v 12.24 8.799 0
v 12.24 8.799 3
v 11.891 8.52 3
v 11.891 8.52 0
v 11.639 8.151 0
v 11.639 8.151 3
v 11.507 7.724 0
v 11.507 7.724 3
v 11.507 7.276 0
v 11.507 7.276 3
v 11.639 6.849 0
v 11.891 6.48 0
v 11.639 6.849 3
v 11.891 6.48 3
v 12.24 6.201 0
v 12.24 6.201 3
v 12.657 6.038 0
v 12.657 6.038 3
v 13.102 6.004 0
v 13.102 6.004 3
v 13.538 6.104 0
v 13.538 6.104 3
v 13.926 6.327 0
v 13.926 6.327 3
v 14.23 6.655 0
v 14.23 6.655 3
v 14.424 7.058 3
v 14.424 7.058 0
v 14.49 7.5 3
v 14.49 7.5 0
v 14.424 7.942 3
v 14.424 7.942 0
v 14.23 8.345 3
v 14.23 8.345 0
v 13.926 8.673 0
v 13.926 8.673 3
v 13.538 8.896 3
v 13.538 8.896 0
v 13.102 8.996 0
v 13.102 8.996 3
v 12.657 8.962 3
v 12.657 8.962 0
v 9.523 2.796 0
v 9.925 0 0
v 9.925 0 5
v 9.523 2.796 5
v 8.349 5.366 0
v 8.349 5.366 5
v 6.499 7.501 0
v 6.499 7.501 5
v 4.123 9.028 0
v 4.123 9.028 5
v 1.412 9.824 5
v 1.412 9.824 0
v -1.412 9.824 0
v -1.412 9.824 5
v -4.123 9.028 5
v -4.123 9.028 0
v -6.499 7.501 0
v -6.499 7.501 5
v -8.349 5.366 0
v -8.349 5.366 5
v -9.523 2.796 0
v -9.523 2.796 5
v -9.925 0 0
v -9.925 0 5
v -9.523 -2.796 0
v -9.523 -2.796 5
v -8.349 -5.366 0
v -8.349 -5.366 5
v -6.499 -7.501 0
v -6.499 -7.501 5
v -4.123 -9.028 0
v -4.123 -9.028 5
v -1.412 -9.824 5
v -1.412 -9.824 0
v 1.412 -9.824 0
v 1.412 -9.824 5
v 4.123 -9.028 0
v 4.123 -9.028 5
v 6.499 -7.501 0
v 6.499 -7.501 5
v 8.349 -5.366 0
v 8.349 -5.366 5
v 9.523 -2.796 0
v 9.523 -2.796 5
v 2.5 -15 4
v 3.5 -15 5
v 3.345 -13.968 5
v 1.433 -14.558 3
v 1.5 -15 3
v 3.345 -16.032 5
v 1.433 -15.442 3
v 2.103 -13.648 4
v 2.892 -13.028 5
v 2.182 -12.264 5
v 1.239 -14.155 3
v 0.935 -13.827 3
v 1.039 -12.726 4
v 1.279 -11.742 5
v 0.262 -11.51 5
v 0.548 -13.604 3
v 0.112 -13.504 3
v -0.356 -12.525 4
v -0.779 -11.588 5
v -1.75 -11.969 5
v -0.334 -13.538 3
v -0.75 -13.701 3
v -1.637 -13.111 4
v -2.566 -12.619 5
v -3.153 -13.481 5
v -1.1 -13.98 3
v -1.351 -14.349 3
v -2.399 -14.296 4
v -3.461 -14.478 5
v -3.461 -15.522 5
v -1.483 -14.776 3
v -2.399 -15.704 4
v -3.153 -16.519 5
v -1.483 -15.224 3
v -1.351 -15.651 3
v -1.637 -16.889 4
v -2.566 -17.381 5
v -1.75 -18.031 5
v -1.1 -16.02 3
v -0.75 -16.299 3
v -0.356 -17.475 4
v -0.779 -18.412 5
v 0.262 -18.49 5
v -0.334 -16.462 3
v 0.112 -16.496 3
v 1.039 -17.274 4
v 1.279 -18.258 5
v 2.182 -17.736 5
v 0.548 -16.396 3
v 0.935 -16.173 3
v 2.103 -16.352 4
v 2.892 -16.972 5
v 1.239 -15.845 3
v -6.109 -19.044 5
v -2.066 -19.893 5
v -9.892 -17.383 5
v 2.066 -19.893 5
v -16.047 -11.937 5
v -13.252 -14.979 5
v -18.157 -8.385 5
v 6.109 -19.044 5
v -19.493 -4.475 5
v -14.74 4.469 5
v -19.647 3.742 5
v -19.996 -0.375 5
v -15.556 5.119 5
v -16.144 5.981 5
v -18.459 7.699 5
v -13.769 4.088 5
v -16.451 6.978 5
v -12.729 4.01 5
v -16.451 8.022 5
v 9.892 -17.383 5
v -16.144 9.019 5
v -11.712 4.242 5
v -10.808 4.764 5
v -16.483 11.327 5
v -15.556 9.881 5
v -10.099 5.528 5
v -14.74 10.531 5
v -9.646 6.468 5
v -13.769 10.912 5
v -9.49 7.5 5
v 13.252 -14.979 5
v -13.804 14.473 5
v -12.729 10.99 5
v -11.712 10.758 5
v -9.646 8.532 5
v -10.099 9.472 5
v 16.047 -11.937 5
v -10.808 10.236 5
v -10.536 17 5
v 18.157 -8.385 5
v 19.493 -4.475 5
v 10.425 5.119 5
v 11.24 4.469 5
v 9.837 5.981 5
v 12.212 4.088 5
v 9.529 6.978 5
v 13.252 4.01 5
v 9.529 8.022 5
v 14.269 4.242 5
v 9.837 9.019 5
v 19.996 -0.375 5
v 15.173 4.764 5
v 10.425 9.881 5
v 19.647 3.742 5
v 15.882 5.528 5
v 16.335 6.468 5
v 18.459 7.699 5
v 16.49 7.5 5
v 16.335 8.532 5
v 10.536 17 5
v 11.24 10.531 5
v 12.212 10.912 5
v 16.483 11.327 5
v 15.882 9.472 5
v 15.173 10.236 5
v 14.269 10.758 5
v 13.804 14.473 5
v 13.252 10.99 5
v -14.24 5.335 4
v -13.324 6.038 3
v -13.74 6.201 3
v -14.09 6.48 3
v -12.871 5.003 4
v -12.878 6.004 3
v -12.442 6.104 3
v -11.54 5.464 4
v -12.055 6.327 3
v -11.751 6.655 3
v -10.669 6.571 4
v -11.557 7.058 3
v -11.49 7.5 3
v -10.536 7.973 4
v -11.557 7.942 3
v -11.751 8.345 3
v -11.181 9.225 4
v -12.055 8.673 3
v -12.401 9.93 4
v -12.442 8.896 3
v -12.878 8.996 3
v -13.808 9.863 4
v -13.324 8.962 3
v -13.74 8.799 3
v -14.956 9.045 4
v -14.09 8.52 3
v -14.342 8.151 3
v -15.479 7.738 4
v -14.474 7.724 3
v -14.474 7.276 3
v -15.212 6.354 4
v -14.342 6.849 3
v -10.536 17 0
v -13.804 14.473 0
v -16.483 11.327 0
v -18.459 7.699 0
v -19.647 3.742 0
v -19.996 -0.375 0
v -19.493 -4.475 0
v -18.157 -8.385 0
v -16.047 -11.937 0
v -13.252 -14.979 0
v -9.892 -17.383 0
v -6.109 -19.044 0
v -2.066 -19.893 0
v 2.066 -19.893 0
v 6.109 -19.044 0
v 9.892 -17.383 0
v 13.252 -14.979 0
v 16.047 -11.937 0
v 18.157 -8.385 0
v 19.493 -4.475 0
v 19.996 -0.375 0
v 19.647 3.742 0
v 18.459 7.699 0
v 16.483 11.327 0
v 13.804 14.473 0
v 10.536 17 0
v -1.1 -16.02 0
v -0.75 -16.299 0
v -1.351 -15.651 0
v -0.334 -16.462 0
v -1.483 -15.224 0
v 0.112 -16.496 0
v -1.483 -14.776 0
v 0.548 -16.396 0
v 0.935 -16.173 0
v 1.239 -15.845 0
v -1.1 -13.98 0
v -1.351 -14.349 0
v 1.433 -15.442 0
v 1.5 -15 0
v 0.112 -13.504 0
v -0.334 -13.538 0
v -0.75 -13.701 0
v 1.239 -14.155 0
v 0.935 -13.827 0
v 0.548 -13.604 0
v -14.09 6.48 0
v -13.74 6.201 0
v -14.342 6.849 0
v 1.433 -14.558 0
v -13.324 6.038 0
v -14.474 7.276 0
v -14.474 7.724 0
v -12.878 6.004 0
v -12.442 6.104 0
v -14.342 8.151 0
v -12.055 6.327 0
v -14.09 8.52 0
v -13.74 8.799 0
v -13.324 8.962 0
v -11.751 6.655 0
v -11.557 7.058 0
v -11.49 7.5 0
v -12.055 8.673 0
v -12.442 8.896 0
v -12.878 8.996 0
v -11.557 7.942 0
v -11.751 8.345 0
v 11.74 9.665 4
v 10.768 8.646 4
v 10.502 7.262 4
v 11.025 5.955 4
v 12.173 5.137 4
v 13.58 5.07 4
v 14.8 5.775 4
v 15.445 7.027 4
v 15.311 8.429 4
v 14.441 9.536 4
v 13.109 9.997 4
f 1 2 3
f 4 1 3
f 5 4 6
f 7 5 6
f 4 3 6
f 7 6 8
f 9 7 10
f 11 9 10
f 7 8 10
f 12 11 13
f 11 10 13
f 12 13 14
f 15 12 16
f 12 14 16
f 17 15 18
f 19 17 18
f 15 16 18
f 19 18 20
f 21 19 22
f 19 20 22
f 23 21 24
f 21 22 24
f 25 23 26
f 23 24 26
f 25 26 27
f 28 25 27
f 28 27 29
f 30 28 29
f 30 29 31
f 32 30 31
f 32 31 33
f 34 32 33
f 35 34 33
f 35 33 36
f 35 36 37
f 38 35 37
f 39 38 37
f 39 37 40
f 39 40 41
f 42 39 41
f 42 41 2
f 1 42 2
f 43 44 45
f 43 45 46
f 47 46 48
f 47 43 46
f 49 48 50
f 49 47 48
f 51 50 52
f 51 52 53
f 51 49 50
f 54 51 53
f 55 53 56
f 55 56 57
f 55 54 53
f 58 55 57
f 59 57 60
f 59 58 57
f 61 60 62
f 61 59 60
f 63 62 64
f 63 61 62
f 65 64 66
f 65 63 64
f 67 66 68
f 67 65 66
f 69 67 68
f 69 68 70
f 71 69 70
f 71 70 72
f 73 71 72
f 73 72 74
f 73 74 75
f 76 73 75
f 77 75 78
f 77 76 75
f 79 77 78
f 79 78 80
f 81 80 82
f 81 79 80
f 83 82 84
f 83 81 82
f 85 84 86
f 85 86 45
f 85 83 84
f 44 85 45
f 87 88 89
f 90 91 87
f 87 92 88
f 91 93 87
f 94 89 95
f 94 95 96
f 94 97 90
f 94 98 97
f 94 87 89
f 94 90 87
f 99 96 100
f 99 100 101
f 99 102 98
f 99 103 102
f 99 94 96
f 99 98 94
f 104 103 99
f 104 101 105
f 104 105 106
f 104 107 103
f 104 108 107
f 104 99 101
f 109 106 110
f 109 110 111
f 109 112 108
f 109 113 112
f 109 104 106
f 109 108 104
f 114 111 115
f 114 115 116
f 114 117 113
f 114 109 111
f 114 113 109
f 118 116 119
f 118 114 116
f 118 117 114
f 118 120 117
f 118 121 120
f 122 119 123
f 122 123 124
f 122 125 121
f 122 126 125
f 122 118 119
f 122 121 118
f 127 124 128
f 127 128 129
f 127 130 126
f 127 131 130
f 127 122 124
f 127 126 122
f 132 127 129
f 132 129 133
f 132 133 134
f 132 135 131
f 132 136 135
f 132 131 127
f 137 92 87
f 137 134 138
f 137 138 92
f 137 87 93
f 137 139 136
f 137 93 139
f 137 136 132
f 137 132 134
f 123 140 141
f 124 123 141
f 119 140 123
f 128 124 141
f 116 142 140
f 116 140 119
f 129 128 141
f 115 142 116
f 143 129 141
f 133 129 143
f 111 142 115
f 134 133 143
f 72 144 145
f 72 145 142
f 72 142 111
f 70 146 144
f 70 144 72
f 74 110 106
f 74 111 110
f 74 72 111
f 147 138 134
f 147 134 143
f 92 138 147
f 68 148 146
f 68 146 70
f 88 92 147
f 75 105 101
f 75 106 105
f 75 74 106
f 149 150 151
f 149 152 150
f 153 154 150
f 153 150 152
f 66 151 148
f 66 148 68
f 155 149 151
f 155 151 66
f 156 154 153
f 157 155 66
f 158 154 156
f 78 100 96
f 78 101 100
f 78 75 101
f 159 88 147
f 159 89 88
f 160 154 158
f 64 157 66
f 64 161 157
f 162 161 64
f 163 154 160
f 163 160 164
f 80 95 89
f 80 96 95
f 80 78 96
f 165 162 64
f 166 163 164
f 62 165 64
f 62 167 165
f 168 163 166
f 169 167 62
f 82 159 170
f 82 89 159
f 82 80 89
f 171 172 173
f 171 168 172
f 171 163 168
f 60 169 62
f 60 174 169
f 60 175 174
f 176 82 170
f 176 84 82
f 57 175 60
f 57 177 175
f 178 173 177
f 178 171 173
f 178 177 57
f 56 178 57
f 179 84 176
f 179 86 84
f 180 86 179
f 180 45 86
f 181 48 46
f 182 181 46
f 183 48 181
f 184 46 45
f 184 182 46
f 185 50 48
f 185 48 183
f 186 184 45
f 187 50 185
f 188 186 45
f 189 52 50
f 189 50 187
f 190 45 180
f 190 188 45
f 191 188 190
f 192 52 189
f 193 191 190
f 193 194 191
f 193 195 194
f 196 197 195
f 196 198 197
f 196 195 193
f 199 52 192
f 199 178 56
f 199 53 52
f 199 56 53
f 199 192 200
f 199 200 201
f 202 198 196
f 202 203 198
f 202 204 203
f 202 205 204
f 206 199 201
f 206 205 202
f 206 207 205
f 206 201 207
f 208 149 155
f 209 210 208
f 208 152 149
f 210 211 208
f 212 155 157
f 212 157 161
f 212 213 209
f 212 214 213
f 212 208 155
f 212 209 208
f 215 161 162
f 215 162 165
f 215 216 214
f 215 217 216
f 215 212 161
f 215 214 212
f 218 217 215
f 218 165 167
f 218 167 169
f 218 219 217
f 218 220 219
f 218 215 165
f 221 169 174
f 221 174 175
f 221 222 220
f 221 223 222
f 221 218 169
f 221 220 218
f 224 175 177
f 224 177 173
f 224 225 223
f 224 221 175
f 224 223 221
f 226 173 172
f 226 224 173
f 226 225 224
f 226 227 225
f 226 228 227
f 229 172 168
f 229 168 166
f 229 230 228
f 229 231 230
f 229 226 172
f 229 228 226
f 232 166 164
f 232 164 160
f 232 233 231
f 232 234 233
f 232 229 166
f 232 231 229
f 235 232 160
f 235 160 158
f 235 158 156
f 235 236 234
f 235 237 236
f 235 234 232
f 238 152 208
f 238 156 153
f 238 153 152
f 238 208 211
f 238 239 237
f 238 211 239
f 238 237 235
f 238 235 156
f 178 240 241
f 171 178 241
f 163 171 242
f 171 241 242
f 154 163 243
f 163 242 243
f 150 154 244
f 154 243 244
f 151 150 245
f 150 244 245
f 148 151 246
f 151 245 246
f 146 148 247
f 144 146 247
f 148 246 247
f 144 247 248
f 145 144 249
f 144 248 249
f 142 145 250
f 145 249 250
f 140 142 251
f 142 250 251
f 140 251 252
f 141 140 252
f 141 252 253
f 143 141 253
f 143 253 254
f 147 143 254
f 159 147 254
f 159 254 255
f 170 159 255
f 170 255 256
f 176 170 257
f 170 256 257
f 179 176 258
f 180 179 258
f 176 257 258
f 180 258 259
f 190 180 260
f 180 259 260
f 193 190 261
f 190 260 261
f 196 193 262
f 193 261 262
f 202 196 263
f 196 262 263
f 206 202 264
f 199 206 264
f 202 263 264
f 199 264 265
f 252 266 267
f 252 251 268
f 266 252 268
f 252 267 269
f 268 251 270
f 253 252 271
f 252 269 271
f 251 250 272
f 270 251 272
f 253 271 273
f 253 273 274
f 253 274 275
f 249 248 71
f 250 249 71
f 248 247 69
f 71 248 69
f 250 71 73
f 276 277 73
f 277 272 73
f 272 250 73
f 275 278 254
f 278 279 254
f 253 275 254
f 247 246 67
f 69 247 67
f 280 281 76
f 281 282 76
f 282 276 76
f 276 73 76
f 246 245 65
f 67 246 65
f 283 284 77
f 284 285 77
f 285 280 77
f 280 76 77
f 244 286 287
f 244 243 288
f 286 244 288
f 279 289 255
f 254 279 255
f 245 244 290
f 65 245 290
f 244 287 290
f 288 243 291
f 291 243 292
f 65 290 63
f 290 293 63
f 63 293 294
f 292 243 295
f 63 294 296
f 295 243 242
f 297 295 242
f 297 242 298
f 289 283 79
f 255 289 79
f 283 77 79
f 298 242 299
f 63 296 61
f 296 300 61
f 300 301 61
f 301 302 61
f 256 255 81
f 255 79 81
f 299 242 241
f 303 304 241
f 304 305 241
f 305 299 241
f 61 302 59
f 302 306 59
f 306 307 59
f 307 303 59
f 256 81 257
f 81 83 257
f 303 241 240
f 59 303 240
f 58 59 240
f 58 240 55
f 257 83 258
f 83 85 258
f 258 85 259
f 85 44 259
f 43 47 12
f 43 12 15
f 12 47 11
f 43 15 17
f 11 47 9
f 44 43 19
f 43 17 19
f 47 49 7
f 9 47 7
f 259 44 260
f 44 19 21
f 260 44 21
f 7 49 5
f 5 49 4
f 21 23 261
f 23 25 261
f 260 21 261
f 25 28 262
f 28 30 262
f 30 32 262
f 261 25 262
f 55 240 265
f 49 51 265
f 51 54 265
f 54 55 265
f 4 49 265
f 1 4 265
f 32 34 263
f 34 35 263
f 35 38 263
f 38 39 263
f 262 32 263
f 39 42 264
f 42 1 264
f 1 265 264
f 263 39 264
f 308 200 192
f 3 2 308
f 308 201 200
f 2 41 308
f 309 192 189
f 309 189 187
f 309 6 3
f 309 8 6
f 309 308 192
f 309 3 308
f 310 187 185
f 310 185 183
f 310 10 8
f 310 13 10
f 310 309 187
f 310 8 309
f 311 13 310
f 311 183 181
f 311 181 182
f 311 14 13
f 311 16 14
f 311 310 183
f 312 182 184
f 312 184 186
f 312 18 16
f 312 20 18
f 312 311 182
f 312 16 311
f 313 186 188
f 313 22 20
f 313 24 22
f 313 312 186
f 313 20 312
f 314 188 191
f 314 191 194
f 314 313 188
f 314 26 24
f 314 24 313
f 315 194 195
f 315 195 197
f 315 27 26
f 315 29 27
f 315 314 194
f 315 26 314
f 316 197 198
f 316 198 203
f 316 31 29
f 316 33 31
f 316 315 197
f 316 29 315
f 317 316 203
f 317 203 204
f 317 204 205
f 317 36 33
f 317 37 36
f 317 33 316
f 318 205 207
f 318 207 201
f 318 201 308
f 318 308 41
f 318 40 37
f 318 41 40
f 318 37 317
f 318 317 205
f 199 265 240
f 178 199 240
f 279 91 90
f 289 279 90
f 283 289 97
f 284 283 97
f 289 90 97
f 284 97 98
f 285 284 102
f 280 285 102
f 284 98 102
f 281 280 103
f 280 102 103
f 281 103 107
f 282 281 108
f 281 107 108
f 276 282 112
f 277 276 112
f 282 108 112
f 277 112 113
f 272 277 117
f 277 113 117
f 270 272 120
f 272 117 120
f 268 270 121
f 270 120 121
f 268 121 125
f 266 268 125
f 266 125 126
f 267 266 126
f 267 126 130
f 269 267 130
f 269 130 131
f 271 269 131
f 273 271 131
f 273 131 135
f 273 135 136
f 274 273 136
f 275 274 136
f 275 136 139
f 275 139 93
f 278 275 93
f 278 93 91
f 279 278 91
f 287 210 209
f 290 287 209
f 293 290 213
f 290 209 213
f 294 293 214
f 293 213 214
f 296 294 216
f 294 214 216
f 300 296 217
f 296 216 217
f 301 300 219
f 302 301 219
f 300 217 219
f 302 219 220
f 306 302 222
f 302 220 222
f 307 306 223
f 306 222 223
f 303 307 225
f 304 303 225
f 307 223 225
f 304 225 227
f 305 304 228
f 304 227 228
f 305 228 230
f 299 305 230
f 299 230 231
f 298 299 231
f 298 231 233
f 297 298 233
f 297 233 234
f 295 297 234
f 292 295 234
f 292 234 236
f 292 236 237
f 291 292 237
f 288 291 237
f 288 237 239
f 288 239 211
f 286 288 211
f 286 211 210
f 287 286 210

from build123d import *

# Parameters (mm, degrees)
SKETCH1_R           = 9.925
BOSS_EXTRUDE1_DEPTH = 5
SKETCH2_R           = 1.5
CUT_EXTRUDE1_DEPTH  = 29.722813233
CIRPATTERN1_COUNT   = 3
CHAMFER1_SIZE       = 2


with BuildPart() as part:
    # Sketch1 → Boss-Extrude1 (new body)
    with BuildSketch(Plane.XY):
        with BuildLine():
            Line((10.535653753, 17), (-10.535653753, 17))
            ThreePointArc((-10.535653753, 17), (0, -20), (10.535653753, 17))
        make_face()
        Circle(SKETCH1_R, mode=Mode.SUBTRACT)
    extrude(amount=BOSS_EXTRUDE1_DEPTH)

    # Sketch2 → Cut-Extrude1 (cut, through all)
    with BuildSketch(Plane.XY.offset(5)):
        with Locations((0, -15)):
            Circle(SKETCH2_R)
    cut_extrude1 = extrude(amount=-CUT_EXTRUDE1_DEPTH, mode=Mode.SUBTRACT)

    # CirPattern1: Cut-Extrude1 ×3 about axis
    cirpattern1_axis = Axis((0, 0, 0), (0, 0, 1))
    for i in range(1, CIRPATTERN1_COUNT):
        add(cut_extrude1.rotate(cirpattern1_axis, i * 360 / CIRPATTERN1_COUNT), mode=Mode.SUBTRACT)

    # Chamfer1
    chamfer1_edges = [part.edges().sort_by_distance(p)[0] for p in [
        (-1.5, -15, 5),
        (13.740381057, 6.200961894, 5),
        (-12.240381057, 8.799038106, 5),
    ]]
    chamfer(chamfer1_edges, length=CHAMFER1_SIZE)


solid = part.part
